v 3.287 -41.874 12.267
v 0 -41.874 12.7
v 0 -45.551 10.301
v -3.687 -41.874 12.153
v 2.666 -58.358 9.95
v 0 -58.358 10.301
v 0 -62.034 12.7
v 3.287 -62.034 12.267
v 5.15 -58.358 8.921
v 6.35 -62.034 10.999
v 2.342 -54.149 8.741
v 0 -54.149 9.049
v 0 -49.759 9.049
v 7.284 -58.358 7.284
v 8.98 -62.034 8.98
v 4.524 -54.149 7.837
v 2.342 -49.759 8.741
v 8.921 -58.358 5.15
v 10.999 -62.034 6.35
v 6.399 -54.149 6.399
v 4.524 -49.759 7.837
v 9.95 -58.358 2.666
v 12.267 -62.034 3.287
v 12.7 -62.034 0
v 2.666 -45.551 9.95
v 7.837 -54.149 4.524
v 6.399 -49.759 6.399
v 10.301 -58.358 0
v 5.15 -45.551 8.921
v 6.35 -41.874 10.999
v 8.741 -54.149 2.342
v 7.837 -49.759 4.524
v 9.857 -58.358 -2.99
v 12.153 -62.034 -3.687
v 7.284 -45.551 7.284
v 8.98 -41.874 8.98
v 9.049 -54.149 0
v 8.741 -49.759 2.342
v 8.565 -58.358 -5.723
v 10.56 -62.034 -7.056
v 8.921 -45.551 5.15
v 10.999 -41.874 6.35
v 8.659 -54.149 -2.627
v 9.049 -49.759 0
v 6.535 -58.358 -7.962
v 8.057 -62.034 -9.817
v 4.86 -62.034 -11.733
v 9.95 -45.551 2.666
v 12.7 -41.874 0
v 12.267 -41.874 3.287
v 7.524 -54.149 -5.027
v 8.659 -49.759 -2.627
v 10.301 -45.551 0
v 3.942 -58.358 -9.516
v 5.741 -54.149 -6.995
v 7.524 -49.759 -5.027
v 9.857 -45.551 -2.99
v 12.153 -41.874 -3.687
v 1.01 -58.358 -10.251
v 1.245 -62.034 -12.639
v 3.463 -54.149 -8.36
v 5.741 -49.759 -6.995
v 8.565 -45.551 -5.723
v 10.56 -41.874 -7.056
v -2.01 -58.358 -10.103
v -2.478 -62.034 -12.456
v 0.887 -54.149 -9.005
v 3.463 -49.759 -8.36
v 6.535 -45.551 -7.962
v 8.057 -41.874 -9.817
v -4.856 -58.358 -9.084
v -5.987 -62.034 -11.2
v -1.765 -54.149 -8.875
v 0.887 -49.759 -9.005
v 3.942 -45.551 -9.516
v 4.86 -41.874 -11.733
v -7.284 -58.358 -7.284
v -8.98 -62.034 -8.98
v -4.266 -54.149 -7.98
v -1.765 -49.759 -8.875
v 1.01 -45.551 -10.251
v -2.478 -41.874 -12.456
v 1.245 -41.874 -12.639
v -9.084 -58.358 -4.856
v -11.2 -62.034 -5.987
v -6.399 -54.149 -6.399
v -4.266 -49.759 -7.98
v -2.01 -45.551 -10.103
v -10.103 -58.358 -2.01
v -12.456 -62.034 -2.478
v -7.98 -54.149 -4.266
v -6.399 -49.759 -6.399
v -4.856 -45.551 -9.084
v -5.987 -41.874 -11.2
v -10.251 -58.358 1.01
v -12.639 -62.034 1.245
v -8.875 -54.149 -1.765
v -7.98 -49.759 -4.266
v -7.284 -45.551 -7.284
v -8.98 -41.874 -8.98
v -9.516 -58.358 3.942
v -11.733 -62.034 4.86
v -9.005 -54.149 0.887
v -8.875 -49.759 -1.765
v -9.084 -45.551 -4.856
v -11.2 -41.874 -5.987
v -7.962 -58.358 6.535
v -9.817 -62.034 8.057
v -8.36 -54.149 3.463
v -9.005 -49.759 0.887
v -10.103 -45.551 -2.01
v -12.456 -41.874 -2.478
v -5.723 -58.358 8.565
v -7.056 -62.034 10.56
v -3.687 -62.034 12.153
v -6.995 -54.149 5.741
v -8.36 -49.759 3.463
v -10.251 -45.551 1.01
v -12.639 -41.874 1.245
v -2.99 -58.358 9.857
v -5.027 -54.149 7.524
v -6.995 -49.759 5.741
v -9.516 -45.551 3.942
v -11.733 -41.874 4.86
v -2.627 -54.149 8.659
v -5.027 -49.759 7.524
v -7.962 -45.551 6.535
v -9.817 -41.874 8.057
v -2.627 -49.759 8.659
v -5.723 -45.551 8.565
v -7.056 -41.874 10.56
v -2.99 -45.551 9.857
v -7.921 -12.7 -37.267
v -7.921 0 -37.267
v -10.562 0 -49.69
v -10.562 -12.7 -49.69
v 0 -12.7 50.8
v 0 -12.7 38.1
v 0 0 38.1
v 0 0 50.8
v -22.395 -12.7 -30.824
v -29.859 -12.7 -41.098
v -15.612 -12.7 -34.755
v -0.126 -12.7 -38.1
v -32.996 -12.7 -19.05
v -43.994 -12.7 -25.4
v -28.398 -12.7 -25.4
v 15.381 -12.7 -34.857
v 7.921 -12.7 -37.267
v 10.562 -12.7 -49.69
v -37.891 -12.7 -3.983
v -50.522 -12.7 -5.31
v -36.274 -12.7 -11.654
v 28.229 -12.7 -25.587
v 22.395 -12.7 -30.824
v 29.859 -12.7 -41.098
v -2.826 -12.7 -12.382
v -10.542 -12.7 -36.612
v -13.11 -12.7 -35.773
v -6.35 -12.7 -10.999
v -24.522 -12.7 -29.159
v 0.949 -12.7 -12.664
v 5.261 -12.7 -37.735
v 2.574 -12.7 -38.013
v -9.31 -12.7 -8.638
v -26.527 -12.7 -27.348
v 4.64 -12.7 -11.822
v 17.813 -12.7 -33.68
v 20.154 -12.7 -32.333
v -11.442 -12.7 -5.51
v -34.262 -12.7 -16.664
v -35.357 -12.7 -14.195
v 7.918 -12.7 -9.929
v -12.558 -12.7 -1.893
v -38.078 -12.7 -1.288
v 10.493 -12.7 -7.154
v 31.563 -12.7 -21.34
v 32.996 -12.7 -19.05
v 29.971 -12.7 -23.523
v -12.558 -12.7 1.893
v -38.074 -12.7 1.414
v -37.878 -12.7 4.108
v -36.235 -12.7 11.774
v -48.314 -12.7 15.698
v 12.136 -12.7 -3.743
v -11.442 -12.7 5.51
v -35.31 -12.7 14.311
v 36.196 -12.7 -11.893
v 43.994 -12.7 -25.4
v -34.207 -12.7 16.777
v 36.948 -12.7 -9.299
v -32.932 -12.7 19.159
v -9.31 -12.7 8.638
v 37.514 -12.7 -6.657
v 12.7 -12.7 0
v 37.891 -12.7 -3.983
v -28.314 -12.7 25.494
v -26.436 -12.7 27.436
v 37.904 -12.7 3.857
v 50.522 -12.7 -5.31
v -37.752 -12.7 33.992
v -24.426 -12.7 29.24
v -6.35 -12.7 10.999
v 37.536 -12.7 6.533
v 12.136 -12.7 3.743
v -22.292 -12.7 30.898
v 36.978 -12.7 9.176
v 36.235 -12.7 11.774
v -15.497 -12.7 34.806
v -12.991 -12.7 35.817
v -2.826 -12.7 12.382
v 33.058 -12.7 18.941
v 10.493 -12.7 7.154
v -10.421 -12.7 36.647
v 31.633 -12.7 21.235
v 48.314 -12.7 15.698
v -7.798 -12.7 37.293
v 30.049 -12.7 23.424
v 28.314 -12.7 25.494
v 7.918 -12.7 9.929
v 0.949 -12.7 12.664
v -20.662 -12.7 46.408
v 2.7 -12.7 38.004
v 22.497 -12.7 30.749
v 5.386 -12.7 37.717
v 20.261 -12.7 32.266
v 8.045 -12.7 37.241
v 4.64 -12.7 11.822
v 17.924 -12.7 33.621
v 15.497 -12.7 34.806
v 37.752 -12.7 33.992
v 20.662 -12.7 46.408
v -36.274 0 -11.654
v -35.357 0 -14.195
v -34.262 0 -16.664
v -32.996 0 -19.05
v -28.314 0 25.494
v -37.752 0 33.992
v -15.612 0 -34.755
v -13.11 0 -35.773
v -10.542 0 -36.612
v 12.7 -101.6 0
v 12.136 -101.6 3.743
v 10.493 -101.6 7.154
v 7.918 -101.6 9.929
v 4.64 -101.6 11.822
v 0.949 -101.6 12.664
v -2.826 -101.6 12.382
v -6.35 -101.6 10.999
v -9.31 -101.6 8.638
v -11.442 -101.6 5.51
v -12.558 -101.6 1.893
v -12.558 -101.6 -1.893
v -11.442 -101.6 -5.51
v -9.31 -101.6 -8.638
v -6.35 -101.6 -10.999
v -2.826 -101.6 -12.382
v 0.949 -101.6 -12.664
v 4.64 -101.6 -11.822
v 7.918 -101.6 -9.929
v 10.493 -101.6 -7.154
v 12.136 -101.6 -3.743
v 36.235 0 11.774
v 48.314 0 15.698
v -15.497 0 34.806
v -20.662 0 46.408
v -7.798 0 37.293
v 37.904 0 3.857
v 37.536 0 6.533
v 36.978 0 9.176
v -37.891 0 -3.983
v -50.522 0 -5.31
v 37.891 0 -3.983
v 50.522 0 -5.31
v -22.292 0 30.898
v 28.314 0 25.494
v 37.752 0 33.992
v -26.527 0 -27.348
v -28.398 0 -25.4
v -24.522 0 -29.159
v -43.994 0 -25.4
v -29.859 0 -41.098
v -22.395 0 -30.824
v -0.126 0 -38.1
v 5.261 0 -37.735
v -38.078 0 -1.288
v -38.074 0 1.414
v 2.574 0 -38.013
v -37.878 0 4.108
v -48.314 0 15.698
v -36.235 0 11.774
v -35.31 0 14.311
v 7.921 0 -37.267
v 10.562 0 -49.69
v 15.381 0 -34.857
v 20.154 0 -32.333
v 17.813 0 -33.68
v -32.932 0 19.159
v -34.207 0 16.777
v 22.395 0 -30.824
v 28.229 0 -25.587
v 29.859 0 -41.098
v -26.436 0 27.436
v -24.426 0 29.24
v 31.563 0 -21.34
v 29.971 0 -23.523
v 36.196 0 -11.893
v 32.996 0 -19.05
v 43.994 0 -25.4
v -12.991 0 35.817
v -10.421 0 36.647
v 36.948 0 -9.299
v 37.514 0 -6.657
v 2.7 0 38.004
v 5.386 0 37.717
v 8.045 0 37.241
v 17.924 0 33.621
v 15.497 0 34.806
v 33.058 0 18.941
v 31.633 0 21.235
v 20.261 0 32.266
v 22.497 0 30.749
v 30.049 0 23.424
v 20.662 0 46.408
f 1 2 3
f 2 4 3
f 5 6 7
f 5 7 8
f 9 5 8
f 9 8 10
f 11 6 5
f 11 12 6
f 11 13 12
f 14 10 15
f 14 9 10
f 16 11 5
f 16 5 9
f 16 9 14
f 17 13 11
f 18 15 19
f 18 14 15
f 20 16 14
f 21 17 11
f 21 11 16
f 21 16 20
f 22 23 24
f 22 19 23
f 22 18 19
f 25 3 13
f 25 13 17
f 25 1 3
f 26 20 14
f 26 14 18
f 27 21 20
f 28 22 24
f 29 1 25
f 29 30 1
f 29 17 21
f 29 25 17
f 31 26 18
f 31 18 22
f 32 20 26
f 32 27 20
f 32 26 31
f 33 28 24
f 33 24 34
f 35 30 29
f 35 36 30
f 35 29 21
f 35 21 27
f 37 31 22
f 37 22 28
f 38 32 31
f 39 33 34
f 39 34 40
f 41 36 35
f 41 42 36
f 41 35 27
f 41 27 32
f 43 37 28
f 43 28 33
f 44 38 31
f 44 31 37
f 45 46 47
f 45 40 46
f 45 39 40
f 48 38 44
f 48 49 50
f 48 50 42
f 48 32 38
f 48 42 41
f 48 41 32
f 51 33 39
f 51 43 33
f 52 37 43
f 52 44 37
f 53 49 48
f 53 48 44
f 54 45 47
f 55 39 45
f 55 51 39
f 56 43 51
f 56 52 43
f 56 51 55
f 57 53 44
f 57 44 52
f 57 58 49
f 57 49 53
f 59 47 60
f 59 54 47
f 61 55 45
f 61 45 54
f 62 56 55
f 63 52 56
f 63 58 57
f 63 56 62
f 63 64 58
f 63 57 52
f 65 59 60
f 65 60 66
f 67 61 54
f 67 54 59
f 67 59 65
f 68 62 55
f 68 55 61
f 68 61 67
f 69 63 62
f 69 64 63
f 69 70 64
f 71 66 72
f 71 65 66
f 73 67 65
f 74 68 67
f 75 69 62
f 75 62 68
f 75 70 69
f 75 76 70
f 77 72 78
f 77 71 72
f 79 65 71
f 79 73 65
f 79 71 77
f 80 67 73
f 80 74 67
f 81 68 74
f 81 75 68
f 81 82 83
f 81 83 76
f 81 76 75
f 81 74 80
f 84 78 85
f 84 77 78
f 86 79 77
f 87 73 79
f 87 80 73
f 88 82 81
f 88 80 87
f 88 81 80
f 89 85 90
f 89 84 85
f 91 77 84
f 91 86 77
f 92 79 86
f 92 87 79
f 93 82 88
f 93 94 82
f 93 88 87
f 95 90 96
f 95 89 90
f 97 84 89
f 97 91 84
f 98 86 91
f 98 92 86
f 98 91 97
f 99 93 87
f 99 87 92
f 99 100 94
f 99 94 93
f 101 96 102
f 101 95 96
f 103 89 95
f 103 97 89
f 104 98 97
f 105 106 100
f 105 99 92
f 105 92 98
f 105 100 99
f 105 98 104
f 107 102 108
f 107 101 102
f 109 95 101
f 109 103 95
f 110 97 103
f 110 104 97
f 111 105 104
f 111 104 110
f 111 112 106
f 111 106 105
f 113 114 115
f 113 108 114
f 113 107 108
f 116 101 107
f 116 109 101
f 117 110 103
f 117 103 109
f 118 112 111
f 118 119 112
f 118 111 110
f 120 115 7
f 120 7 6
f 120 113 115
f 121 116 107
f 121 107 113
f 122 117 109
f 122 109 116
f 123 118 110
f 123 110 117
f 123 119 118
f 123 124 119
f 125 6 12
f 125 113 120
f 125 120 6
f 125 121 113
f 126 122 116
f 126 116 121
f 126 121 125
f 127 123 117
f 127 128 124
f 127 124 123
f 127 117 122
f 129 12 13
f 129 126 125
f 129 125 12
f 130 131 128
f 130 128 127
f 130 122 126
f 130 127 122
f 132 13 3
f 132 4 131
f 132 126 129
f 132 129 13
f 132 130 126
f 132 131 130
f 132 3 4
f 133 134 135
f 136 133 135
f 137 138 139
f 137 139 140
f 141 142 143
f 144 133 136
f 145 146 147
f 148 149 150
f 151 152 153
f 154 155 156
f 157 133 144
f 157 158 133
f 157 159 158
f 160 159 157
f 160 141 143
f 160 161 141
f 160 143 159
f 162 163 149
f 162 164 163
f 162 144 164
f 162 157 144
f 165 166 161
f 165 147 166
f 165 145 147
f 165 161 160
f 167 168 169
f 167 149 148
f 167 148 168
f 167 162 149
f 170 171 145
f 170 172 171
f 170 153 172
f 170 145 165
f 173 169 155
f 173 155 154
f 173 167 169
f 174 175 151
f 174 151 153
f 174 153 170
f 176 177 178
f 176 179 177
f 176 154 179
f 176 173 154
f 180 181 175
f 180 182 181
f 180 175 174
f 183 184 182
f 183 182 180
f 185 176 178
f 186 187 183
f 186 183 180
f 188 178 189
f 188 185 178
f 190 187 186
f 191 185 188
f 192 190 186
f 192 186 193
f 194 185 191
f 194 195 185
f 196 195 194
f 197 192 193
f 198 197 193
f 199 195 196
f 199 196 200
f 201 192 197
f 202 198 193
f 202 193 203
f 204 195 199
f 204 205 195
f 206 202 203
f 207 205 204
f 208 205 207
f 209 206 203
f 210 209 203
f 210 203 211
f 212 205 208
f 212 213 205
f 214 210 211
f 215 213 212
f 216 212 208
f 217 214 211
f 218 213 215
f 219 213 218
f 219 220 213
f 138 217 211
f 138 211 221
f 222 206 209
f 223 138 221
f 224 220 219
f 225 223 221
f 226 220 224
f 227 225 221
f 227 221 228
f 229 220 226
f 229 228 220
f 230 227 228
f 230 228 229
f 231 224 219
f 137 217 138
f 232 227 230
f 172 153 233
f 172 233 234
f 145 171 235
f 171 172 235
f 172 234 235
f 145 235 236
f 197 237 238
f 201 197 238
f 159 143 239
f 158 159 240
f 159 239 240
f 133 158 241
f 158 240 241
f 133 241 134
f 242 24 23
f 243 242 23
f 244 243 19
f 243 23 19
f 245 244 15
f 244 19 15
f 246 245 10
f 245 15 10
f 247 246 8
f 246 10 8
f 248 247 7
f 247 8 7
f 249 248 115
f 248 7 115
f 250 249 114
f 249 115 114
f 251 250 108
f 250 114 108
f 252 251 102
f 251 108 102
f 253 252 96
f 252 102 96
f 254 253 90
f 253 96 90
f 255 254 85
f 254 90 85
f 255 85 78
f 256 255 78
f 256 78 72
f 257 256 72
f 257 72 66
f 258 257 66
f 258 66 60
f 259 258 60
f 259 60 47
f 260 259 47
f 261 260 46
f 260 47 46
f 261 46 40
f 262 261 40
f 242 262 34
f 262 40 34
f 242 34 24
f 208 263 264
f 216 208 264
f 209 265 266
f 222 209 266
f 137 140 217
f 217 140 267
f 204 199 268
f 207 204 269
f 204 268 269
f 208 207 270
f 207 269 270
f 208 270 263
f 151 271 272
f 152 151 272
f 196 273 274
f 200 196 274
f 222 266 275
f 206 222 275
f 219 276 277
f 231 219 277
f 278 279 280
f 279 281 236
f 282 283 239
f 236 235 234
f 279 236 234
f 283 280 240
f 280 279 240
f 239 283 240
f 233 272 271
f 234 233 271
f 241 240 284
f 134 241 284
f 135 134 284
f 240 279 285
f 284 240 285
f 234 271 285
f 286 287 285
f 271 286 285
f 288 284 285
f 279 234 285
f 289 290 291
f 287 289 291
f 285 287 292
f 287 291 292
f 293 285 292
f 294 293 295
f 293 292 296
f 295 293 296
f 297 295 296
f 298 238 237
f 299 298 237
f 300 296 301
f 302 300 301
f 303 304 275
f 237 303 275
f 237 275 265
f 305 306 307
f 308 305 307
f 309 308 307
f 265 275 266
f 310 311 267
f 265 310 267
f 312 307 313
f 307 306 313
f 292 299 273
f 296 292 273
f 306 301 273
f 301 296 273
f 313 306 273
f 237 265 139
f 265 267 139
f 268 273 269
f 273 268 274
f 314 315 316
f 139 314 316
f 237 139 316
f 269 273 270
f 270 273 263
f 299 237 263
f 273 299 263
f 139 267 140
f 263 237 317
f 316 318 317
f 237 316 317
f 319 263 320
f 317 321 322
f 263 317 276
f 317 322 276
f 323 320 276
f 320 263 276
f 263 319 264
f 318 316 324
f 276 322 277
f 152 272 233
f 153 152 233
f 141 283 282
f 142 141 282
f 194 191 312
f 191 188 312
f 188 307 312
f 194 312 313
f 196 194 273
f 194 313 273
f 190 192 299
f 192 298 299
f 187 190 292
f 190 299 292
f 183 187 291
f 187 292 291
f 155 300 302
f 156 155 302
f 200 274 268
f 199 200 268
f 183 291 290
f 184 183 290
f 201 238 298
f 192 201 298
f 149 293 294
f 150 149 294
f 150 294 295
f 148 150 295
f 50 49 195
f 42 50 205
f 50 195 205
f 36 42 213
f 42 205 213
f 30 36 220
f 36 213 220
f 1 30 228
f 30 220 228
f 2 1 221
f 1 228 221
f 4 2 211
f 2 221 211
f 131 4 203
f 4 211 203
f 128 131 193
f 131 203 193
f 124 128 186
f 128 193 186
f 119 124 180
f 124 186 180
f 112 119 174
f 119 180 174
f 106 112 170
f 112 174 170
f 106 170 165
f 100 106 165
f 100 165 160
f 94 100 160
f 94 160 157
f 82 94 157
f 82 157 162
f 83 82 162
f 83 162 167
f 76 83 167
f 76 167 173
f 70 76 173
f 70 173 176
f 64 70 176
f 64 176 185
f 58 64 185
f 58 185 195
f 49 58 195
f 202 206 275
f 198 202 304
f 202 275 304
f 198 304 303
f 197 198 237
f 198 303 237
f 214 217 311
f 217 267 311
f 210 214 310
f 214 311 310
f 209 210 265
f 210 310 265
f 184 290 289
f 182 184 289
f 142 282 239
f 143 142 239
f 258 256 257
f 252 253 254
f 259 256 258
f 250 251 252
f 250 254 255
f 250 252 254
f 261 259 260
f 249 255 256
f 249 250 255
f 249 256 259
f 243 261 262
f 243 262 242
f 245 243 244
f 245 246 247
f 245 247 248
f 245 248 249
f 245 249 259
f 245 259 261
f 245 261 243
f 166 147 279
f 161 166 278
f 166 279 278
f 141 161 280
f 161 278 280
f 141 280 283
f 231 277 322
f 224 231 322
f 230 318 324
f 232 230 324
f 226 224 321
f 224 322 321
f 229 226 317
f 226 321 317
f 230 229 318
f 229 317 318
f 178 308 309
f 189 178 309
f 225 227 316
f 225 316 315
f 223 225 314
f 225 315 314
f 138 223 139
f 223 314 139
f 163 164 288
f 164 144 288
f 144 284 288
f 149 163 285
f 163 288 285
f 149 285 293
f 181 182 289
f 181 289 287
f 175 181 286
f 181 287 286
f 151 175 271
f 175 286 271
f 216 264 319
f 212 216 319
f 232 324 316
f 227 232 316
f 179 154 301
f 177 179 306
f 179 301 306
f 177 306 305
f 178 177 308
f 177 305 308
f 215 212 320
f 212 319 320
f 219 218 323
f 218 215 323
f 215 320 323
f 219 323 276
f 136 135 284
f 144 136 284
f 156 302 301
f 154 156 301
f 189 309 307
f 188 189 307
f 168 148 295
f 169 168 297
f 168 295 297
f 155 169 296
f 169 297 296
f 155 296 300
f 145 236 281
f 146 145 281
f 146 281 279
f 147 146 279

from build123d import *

# Parameters (mm, degrees)
F0_R            = 38.1
F1_DEPTH        = 12.7
F3_DEPTH        = 12.7
F3_COPIES_COUNT = 15
F4_R            = 12.7
F5_DEPTH        = 101.6


# Not quite as in the source:
# - a pattern or mirror of a feature is missing from the dataset's text; its kind, count and spacing are read off the source's solid


with BuildPart() as f1:
    # F0 (on Front) → F1 (new body)
    with BuildSketch(Plane.XZ):
        Circle(F0_R)
    extrude(amount=F1_DEPTH)

    # F2 (on Front) → F3 (join, through all)
    with BuildSketch(Plane.XZ):
        Polygon((0, 50.8), (-7.798013599, 37.2934442484), (0, 38.1), align=None)
    f3 = extrude(amount=F3_DEPTH)

    # F3_copies: F3 ×15 about axis
    f3_copies_axis = Axis((0, 0, 0), (0, 1, 0))
    for i in range(1, F3_COPIES_COUNT):
        add(f3.rotate(f3_copies_axis, i * 360 / F3_COPIES_COUNT))

    # F4 (on Front) → F5 (join)
    with BuildSketch(Plane.XZ):
        Circle(F4_R)
    extrude(amount=F5_DEPTH)

    # F6 (on Right) → F7 (revolve, cut)
    with BuildSketch(Plane.YZ):
        with BuildLine():
            Line((-38.1, 17.78), (-65.8081287712, 17.78))
            ThreePointArc((-65.8081287712, 17.78), (-51.9540643856, 8.89), (-38.1, 17.78))
        make_face()
    revolve(axis=Axis((0, 0, 0), (0, 1, 0)), mode=Mode.SUBTRACT)


solid = f1.part
